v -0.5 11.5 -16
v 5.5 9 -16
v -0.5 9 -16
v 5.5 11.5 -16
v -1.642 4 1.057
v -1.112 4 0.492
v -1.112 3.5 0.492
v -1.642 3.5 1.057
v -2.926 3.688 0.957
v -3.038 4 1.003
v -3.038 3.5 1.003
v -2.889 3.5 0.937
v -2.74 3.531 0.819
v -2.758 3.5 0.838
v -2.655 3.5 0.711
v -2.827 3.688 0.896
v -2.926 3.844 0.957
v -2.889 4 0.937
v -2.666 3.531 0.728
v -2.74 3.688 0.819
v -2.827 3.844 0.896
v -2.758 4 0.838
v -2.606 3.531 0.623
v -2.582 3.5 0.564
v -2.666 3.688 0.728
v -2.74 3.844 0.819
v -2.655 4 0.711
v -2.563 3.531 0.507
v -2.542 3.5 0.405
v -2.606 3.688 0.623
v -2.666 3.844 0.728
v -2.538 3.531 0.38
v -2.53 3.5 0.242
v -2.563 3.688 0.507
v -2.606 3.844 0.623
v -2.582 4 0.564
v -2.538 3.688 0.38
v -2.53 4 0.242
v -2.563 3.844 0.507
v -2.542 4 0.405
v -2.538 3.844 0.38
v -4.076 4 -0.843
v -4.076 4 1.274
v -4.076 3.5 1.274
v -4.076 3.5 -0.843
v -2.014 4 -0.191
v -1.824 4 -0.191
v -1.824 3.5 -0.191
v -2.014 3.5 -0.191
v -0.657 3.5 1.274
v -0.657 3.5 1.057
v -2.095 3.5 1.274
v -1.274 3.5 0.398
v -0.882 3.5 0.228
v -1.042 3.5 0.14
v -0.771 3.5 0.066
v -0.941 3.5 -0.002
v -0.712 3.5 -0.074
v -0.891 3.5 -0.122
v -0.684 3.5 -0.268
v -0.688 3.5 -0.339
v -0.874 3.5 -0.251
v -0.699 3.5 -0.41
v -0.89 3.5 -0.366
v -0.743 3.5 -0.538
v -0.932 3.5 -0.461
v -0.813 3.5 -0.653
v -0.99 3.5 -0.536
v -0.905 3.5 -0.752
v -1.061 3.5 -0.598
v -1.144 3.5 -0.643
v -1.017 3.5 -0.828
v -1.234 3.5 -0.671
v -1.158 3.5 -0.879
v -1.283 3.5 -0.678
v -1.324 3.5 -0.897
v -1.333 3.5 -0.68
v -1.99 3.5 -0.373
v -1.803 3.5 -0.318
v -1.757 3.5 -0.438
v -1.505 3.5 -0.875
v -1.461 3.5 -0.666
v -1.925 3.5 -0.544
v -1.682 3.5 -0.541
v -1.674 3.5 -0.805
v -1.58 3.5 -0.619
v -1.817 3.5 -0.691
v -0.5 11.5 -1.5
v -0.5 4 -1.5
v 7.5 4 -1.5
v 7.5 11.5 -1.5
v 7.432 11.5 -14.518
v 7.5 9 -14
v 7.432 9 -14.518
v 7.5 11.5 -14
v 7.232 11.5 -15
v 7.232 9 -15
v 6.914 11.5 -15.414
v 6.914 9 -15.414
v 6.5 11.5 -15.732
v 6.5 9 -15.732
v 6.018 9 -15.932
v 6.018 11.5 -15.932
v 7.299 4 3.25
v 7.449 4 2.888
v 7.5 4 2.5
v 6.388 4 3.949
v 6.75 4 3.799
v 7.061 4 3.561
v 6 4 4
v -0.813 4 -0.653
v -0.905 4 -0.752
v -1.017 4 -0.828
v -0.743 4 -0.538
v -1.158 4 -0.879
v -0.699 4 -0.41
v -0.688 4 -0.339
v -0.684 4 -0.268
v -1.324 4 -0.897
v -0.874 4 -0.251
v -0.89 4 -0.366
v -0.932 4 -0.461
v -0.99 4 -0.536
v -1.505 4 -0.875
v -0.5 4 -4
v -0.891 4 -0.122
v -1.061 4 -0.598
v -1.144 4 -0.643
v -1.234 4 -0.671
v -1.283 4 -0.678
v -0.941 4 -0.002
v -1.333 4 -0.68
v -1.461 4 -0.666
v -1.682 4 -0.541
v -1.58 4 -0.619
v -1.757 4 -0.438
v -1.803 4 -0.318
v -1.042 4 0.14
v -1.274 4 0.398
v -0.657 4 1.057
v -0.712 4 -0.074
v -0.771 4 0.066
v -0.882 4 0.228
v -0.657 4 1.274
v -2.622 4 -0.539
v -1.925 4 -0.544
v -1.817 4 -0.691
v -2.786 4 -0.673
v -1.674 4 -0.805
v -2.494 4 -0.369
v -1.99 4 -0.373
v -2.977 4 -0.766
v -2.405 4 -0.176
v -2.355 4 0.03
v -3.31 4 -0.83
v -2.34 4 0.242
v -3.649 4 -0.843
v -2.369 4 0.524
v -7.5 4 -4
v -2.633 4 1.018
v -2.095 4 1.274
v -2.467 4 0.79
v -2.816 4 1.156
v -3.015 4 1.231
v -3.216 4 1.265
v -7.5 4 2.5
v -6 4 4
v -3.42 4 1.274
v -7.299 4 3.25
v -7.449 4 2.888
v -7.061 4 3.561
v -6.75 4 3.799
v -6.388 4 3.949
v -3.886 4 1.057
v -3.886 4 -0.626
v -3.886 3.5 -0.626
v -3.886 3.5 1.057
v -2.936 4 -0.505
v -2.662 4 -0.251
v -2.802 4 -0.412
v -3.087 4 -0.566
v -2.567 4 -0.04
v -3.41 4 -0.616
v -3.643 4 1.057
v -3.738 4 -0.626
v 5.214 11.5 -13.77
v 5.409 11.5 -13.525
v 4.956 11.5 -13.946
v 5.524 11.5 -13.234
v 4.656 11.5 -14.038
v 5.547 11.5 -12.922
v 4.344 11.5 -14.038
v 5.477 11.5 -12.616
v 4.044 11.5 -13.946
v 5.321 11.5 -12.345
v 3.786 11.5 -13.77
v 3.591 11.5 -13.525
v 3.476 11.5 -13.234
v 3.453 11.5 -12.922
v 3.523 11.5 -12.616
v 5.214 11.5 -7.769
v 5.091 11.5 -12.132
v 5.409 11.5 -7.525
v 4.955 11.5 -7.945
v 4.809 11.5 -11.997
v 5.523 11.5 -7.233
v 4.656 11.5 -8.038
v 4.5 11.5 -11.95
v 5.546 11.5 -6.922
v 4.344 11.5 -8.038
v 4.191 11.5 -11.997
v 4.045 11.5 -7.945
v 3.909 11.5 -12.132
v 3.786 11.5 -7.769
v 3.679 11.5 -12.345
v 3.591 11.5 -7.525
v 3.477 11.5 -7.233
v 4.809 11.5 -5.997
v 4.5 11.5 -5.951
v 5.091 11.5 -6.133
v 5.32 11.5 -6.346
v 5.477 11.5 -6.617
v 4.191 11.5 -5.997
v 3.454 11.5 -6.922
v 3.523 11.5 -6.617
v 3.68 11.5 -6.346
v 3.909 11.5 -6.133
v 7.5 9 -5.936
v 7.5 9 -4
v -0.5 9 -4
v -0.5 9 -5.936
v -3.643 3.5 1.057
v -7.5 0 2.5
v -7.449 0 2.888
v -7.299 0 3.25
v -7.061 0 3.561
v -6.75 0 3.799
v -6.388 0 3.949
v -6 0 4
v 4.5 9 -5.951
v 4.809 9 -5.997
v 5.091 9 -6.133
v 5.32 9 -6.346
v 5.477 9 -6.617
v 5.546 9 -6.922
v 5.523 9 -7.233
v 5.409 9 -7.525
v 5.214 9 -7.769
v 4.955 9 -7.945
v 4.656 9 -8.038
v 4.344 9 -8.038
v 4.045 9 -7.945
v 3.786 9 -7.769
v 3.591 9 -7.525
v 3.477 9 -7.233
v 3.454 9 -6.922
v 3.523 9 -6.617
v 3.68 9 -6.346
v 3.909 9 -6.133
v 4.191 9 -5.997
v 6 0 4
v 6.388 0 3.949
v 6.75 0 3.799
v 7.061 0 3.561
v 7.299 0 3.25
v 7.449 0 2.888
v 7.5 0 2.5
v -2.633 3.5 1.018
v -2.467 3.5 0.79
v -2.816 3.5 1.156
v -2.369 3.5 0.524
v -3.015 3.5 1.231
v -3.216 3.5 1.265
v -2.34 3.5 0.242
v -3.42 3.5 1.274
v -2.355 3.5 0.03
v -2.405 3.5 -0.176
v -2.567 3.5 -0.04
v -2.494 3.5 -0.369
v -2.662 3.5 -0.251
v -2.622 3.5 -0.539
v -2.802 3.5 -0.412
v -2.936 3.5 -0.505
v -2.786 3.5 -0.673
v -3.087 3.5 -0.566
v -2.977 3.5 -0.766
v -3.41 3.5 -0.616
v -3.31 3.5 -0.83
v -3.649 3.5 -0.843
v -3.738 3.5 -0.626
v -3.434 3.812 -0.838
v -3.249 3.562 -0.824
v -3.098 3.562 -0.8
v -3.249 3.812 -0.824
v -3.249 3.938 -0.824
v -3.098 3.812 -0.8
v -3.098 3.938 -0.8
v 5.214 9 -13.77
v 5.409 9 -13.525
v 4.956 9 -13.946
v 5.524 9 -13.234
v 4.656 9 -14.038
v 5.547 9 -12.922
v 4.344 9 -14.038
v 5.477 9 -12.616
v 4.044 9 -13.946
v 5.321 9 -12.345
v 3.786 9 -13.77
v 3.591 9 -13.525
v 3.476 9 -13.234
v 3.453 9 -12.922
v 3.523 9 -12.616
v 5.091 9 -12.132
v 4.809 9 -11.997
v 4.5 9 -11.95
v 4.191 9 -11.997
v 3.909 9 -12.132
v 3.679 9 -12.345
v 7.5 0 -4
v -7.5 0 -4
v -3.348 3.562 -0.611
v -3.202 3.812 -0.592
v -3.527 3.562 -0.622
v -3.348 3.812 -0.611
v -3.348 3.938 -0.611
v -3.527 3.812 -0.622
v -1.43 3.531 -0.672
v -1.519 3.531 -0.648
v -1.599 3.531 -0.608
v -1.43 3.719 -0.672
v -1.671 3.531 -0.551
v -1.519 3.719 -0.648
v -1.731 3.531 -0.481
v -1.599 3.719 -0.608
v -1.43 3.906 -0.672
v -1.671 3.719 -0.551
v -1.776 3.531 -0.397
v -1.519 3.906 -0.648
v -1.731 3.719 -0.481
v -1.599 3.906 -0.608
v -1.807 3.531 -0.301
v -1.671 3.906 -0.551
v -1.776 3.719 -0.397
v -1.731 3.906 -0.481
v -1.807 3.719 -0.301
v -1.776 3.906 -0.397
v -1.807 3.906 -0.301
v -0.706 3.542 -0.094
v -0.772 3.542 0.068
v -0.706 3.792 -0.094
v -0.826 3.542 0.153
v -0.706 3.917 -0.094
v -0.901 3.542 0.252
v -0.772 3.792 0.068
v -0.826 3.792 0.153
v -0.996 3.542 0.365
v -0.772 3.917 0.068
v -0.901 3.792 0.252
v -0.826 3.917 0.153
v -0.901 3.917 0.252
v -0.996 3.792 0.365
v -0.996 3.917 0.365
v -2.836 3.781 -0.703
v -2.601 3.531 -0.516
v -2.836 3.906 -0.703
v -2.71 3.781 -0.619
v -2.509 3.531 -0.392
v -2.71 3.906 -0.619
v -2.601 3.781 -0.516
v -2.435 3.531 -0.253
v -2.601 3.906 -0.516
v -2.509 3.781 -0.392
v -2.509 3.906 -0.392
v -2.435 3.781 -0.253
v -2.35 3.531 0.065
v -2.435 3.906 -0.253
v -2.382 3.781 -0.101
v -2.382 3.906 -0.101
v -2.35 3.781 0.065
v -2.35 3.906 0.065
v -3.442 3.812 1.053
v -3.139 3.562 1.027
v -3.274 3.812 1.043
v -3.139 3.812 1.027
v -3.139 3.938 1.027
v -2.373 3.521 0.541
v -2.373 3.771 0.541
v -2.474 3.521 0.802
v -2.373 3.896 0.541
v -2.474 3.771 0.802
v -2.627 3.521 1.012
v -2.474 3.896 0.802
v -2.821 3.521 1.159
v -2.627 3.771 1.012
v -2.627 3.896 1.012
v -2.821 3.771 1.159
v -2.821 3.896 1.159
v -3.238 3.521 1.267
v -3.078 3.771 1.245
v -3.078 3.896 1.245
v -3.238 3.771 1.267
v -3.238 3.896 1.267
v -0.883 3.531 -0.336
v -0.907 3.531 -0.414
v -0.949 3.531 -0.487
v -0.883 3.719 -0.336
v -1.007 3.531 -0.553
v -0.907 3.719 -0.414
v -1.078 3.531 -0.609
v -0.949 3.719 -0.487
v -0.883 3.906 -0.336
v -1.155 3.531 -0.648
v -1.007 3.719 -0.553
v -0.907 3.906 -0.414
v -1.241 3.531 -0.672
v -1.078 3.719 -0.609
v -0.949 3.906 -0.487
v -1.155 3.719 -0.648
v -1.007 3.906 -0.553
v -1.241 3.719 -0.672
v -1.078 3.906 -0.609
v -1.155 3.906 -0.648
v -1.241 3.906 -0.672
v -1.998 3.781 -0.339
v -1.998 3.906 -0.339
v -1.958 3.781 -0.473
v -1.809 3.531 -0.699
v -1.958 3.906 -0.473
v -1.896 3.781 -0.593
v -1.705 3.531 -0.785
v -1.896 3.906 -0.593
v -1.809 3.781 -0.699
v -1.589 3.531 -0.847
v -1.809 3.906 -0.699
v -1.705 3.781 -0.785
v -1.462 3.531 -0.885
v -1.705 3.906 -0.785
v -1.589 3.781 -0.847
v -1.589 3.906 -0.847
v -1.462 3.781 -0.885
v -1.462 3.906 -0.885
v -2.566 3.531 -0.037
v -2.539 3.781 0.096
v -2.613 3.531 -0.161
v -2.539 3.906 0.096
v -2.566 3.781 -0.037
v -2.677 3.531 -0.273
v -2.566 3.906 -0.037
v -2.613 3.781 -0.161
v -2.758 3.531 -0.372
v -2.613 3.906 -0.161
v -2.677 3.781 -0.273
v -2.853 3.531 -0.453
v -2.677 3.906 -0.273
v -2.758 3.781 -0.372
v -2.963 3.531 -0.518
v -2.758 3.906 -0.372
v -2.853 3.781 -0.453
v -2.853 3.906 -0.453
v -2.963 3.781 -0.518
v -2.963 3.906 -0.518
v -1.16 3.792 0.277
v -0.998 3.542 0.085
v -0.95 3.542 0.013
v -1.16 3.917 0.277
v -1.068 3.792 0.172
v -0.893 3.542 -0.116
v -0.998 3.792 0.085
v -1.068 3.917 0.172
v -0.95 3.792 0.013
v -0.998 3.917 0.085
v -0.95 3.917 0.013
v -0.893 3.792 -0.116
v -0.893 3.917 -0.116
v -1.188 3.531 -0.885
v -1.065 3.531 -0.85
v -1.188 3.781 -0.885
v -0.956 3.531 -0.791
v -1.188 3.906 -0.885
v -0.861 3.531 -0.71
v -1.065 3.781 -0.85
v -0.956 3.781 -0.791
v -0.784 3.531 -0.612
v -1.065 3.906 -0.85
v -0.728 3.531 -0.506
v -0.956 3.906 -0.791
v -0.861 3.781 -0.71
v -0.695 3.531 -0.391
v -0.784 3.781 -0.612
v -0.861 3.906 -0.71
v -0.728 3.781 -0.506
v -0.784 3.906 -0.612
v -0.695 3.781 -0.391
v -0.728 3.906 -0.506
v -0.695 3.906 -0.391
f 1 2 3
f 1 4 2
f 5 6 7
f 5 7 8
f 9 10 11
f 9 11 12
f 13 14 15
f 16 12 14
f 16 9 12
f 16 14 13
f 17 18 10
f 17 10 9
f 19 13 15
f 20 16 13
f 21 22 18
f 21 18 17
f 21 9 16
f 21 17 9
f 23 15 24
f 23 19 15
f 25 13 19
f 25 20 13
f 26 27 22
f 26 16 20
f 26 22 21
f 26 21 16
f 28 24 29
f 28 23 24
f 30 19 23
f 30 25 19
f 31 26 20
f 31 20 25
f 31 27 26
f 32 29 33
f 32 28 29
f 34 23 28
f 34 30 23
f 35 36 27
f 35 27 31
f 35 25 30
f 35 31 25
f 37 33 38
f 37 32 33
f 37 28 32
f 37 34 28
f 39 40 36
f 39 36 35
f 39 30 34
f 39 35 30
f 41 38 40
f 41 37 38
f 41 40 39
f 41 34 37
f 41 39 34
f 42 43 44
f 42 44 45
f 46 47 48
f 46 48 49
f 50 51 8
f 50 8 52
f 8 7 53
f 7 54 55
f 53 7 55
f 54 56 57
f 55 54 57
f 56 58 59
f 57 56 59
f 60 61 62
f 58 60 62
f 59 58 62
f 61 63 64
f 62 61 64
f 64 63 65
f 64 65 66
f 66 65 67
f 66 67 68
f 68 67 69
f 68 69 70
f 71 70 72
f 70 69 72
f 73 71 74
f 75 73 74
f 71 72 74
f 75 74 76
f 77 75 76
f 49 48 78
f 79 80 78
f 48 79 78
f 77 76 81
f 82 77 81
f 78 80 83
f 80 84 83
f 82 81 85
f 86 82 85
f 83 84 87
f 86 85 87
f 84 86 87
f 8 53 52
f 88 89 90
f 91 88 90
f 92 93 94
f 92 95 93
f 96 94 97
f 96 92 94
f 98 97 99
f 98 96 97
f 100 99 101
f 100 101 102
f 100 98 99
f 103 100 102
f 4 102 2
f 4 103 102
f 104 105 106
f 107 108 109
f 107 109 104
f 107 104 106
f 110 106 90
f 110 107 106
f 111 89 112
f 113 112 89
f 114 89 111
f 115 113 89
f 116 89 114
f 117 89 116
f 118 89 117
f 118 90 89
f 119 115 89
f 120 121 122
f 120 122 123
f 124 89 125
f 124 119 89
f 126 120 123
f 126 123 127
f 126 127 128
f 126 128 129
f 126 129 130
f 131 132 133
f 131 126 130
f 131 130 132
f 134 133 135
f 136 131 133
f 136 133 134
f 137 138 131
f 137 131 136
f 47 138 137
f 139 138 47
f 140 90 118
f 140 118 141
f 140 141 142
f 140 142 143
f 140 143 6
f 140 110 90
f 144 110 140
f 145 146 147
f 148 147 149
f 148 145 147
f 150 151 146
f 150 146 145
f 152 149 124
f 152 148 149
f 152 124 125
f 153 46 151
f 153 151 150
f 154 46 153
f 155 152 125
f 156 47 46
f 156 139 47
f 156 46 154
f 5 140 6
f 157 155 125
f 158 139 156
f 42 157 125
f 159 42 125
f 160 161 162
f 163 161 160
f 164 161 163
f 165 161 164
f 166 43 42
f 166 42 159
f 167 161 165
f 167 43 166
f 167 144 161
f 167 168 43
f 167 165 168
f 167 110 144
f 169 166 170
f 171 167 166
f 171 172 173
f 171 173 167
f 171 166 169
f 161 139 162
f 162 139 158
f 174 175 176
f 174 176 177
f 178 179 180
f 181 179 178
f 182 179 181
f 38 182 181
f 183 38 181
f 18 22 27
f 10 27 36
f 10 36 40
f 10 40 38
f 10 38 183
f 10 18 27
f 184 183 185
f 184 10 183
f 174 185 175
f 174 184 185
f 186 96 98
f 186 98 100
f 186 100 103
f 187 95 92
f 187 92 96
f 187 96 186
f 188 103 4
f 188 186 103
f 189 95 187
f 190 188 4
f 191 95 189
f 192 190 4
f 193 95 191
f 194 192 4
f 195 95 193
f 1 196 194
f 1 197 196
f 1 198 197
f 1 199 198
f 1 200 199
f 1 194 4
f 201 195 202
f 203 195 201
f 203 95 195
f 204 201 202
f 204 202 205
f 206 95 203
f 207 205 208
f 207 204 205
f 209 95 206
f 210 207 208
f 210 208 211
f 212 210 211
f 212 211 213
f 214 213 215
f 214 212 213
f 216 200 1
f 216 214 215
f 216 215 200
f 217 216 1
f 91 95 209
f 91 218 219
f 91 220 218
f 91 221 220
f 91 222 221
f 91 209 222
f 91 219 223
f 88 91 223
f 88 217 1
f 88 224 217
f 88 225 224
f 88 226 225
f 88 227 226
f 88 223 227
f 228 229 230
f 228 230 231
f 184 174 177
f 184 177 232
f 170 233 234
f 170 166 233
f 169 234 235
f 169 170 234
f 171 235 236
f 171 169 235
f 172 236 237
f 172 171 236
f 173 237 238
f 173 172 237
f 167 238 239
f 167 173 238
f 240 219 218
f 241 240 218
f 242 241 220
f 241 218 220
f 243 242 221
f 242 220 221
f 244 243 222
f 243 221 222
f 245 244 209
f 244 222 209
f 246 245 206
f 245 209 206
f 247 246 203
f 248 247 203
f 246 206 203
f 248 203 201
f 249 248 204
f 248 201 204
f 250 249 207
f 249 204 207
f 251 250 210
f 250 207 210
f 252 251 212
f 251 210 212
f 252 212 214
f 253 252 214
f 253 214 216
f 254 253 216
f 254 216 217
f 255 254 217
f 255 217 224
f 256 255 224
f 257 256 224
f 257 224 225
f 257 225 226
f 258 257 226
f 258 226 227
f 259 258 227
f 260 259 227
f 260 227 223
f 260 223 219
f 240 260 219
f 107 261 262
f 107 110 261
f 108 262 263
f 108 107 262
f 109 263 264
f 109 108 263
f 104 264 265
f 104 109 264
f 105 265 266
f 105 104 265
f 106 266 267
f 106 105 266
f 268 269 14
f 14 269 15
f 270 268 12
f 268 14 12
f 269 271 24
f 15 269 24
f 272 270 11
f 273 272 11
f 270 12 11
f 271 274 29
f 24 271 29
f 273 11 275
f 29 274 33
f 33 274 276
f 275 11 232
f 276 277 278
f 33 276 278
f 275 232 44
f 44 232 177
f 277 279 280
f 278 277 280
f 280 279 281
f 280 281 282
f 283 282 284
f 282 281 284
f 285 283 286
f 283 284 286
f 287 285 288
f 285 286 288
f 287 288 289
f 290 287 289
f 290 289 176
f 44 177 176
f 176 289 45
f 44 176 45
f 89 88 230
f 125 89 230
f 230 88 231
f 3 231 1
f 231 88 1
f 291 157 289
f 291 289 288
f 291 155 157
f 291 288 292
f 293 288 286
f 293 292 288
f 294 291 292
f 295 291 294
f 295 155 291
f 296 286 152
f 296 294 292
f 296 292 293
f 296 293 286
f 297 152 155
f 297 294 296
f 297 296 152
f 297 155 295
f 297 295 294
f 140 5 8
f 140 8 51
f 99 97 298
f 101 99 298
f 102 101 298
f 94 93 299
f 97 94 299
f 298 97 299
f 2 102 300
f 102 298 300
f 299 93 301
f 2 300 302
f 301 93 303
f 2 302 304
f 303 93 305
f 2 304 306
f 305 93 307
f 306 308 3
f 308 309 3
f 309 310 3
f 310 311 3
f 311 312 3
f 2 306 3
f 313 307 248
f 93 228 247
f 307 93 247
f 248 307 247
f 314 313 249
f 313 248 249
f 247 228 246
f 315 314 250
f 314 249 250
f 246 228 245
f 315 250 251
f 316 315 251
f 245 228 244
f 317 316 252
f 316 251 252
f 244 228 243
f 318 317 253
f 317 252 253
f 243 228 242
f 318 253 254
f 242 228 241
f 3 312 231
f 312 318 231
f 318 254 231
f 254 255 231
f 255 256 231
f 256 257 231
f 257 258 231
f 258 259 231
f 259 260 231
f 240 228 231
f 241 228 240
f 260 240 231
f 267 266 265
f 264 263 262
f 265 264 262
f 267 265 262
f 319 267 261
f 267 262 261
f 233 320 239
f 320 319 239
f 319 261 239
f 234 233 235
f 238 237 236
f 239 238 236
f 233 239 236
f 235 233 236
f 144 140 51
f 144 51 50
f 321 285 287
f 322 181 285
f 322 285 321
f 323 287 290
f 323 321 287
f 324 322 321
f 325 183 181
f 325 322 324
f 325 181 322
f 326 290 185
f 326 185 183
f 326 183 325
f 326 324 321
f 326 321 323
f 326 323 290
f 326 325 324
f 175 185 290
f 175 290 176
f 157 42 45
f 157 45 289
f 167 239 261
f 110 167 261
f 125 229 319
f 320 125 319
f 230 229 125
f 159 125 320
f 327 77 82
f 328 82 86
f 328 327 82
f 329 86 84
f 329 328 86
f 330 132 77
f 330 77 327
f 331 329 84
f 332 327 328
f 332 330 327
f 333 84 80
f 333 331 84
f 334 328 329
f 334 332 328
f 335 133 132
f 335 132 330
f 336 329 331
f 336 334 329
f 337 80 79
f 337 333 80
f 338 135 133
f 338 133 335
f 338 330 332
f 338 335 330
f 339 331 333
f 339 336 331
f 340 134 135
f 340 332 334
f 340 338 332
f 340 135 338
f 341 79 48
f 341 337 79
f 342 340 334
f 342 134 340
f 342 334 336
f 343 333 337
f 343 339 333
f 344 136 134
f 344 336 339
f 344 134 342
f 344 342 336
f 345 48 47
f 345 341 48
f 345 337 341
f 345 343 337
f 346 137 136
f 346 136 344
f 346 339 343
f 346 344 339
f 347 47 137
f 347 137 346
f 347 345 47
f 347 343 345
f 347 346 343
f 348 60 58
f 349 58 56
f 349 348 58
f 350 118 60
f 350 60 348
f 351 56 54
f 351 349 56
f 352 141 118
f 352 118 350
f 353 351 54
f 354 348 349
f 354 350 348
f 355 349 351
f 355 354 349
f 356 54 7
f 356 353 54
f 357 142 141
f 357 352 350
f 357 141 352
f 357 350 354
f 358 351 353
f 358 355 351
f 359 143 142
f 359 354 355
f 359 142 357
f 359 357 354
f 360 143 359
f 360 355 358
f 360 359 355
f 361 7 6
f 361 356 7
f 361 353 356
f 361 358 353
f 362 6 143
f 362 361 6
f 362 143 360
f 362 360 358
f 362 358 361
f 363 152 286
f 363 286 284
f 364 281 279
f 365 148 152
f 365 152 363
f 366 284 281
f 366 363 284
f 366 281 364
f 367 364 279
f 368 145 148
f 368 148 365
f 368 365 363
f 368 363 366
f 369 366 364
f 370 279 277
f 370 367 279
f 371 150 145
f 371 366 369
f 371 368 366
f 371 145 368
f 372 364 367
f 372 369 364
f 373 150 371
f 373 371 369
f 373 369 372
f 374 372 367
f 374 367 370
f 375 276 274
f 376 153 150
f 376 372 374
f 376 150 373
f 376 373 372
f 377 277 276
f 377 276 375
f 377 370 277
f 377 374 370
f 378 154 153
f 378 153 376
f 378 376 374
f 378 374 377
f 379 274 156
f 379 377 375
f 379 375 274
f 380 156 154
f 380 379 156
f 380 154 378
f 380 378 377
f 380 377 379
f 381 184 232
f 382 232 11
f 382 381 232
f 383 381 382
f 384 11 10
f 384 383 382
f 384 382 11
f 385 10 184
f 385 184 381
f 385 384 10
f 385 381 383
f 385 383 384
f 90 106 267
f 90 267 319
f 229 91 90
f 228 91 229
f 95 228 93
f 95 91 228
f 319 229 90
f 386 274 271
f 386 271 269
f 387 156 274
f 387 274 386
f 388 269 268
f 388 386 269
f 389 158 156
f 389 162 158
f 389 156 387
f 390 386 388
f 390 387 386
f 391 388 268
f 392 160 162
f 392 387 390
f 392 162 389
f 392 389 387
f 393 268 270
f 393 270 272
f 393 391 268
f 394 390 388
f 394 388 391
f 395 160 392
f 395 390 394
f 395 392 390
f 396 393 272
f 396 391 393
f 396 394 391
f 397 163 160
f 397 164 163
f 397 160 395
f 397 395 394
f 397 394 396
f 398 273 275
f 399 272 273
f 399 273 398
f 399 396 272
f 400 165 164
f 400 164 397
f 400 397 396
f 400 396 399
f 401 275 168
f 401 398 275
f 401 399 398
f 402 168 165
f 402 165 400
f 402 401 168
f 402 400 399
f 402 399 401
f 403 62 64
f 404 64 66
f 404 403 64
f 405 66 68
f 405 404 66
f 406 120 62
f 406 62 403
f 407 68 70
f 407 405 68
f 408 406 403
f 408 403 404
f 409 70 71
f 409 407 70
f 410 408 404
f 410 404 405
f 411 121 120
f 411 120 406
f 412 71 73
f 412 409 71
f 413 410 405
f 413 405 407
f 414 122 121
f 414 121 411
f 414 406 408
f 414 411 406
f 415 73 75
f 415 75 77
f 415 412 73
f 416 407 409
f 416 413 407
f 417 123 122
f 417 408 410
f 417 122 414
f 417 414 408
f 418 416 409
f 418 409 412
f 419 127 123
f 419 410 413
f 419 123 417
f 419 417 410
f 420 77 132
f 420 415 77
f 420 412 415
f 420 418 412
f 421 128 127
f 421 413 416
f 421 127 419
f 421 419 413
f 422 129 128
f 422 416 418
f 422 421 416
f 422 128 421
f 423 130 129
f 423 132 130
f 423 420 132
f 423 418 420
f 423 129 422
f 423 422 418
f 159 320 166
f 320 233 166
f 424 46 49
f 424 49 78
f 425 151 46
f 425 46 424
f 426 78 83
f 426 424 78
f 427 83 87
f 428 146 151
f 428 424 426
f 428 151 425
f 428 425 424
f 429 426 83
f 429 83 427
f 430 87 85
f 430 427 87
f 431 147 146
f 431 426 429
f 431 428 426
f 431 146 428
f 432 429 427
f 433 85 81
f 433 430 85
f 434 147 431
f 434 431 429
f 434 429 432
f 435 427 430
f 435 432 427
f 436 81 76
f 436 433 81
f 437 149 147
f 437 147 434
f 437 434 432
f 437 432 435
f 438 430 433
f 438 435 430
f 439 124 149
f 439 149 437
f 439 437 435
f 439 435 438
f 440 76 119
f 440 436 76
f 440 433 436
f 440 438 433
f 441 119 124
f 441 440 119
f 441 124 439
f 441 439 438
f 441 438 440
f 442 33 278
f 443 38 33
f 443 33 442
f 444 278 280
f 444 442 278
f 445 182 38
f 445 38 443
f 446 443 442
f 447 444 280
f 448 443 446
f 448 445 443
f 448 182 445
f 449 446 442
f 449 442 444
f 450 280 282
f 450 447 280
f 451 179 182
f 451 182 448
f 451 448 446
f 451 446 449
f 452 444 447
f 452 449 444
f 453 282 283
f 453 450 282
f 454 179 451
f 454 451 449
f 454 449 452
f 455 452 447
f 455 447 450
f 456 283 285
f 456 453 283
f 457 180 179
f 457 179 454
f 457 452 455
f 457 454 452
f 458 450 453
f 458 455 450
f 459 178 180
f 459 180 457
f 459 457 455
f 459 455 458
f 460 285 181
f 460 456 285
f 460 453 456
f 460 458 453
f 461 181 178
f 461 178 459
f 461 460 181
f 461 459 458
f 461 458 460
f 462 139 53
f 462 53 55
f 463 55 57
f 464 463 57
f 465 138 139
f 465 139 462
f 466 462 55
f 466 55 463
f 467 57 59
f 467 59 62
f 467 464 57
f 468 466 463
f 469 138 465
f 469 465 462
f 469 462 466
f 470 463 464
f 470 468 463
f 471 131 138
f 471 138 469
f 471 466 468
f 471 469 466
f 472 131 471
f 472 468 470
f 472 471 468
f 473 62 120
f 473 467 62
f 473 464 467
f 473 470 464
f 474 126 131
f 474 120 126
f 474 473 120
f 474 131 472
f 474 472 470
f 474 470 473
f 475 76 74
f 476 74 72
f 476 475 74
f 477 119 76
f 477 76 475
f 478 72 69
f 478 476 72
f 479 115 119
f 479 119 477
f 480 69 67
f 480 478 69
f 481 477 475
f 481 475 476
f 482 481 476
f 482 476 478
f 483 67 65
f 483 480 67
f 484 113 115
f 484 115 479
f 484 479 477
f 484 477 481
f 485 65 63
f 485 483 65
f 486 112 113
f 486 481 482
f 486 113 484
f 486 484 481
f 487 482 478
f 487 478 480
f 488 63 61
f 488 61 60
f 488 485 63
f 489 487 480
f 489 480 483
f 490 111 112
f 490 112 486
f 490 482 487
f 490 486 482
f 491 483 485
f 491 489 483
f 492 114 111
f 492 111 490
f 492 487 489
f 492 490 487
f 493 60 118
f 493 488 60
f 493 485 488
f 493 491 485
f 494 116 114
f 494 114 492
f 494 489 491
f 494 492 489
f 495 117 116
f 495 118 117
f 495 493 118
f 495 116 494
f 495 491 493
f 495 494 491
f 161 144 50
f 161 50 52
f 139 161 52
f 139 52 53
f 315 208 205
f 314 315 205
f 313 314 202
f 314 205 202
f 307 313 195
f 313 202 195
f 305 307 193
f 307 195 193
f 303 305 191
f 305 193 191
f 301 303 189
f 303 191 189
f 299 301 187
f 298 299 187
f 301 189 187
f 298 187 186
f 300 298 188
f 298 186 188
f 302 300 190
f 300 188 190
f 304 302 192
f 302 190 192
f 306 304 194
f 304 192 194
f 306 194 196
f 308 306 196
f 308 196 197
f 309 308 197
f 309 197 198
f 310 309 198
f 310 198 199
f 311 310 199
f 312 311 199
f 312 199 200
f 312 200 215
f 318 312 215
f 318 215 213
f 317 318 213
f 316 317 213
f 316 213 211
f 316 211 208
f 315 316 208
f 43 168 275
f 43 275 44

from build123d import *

# Parameters (mm, degrees)
SKETCH1_W           = 15
SKETCH1_H           = 8
BOSS_EXTRUDE1_DEPTH = 4
FILLET1_R           = 1.5
SKETCH10_W          = 7
SKETCH10_H          = 4
CUT_EXTRUDE2_DEPTH  = 7.5
SKETCH11_W          = 8
SKETCH11_H          = 2.5
BOSS_EXTRUDE4_DEPTH = 7.5
SKETCH12_W          = 8
SKETCH12_H          = 2.5
BOSS_EXTRUDE5_DEPTH = 12
FILLET2_R           = 2
SKETCH13_R          = 1.05
SKETCH13_R_2        = 1.049219919
CUT_EXTRUDE3_DEPTH  = 12
SKETCH14_W          = 8
SKETCH14_H          = 1.936154072
BOSS_EXTRUDE6_DEPTH = 7.5
SKETCH16_W          = 7
SKETCH16_H          = 4
BOSS_EXTRUDE7_DEPTH = 4
SKETCH17_W          = 1.936154072
SKETCH17_H          = 7.50023418
CUT_EXTRUDE4_DEPTH  = 8
CUT_EXTRUDE5_DEPTH  = 0.5


with BuildPart() as part:
    # Sketch1 → Boss-Extrude1 (new body)
    with BuildSketch(Plane(origin=(0, 0, 0), x_dir=(1, 0, 0), z_dir=(0, 1, 0))):
        Rectangle(SKETCH1_W, SKETCH1_H)
    extrude(amount=BOSS_EXTRUDE1_DEPTH)

    # Fillet1
    fillet1_edges = [part.edges().sort_by_distance(p)[0] for p in [
        (7.5, 2, 4),
        (-7.5, 2, 4),
    ]]
    fillet(fillet1_edges, radius=FILLET1_R)

    # Sketch10 → Cut-Extrude2 (cut)
    with BuildSketch(Plane(origin=(0, 4, 0), x_dir=(1, 0, 0), z_dir=(0, 1, 0))):
        with Locations((-4, 2)):
            Rectangle(SKETCH10_W, SKETCH10_H)
    extrude(amount=-CUT_EXTRUDE2_DEPTH, mode=Mode.SUBTRACT)

    # Sketch11 → Boss-Extrude4 (add)
    with BuildSketch(Plane(origin=(0, 4, 0), x_dir=(1, 0, 0), z_dir=(0, 1, 0))):
        with Locations((3.5, 2.75)):
            Rectangle(SKETCH11_W, SKETCH11_H)
    extrude(amount=BOSS_EXTRUDE4_DEPTH)

    # Sketch12 → Boss-Extrude5 (add)
    with BuildSketch(Plane(origin=(0, 0, -4), x_dir=(-1, 0, 0), z_dir=(0, 0, -1))):
        with Locations((-3.5, 10.25)):
            Rectangle(SKETCH12_W, SKETCH12_H)
    extrude(amount=BOSS_EXTRUDE5_DEPTH)

    # Fillet2
    fillet2_edges = [part.edges().sort_by_distance(p)[0] for p in [
        (7.5, 10.25, -16),
    ]]
    fillet(fillet2_edges, radius=FILLET2_R)

    # Sketch13 → Cut-Extrude3 (cut)
    with BuildSketch(Plane(origin=(0, 11.5, 0), x_dir=(1, 0, 0), z_dir=(0, 1, 0))):
        with Locations(Location((4.5, 13, 0), (0, 0, 270))):
            Circle(SKETCH13_R)
        with Locations(Location((4.5, 7, 0), (0, 0, 270))):
            Circle(SKETCH13_R_2)
    extrude(amount=-CUT_EXTRUDE3_DEPTH, mode=Mode.SUBTRACT)

    # Sketch14 → Boss-Extrude6 (add)
    with BuildSketch(Plane(origin=(0, 9, 0), x_dir=(-1, 0, 0), z_dir=(0, -1, 0))):
        with Locations((-3.5, 4.968077036)):
            Rectangle(SKETCH14_W, SKETCH14_H)
    extrude(amount=BOSS_EXTRUDE6_DEPTH)

    # Sketch16 → Boss-Extrude7 (add)
    with BuildSketch(Plane(origin=(0, 0, 0), x_dir=(-1, 0, 0), z_dir=(0, 0, -1))):
        with Locations((4, 2)):
            Rectangle(SKETCH16_W, SKETCH16_H)
    extrude(amount=BOSS_EXTRUDE7_DEPTH)

    # Sketch17 → Cut-Extrude4 (cut)
    with BuildSketch(Plane(origin=(7.5, 0, 0), x_dir=(0, 0, -1), z_dir=(1, 0, 0))):
        with Locations((4.968077036, 5.25011709)):
            Rectangle(SKETCH17_W, SKETCH17_H)
    extrude(amount=-CUT_EXTRUDE4_DEPTH, mode=Mode.SUBTRACT)

    # Sketch19 → Cut-Extrude5 (cut)
    # profile 1 of 2: a face of its own
    with BuildSketch(Plane(origin=(0, 4, 0), x_dir=(1, 0, 0), z_dir=(0, 1, 0))):
        with BuildLine():
            Line((-4.076318052, -1.273977892), (-4.076318052, 0.842688775))
            Line((-4.076318052, 0.842688775), (-3.648914206, 0.842688775))
            add(Edge.make_bspline(
                [(-3.648914206, 0.842688775), (-3.611740103, 0.842421125), (-3.539919931, 0.841904028), (-3.43613526, 0.838625377), (-3.34010889, 0.832825428), (-3.252156637, 0.824377191), (-3.172037047, 0.81400369), (-3.09997446, 0.801001064), (-3.035596259, 0.785647266), (-2.996002835, 0.772556922), (-2.97727959, 0.766366659)],
                knots=[0, 0, 0, 0, 1.314313732, 2.53924729, 3.670748893, 4.714932338, 5.66265055, 6.526160246, 7.303039223, 8, 8, 8, 8], degree=3))
            add(Edge.make_bspline(
                [(-2.97727959, 0.766366659), (-2.952789915, 0.757034756), (-2.904365908, 0.738582567), (-2.835418743, 0.703774708), (-2.770512452, 0.664336309), (-2.709298969, 0.620215382), (-2.653176565, 0.570162657), (-2.599952742, 0.516304325), (-2.55180479, 0.456681852), (-2.50771263, 0.39253174), (-2.467958207, 0.32460969), (-2.433402621, 0.253045124), (-2.404704254, 0.178201479), (-2.380880731, 0.10028689), (-2.362105016, 0.019130033), (-2.349294991, -0.065363591), (-2.340845868, -0.152860053), (-2.339996751, -0.212232229), (-2.339565915, -0.242357299)],
                knots=[0, 0, 0, 0, 0.984719456, 1.947108742, 2.898477687, 3.838006223, 4.779231079, 5.722358779, 6.681677486, 7.655904652, 8.64651281, 9.637519902, 10.640069247, 11.656948941, 12.698408672, 13.768548281, 14.867775369, 16, 16, 16, 16], degree=3))
            add(Edge.make_bspline(
                [(-2.339565915, -0.242357299), (-2.339946291, -0.268520048), (-2.34069586, -0.320076478), (-2.347426447, -0.396059305), (-2.357209269, -0.469787989), (-2.372355046, -0.540911436), (-2.390741327, -0.610052787), (-2.414305362, -0.676475144), (-2.441299209, -0.740787829), (-2.472776993, -0.802121255), (-2.507333926, -0.860228818), (-2.54441898, -0.915005447), (-2.583992601, -0.965669509), (-2.62643215, -1.012374432), (-2.671189198, -1.055049806), (-2.718556769, -1.09405212), (-2.76865709, -1.128618227), (-2.821265765, -1.16010643), (-2.87791752, -1.187574931), (-2.939685401, -1.210815937), (-3.006832827, -1.230075557), (-3.079194982, -1.246144622), (-3.156896895, -1.258891372), (-3.240014746, -1.267434476), (-3.328420831, -1.273211726), (-3.389126386, -1.273717544), (-3.420371871, -1.273977892)],
                knots=[0, 0, 0, 0, 1.105936401, 2.179363191, 3.223086493, 4.248585256, 5.251745608, 6.245858792, 7.225916811, 8.198733463, 9.158002045, 10.082870192, 10.993790845, 11.873723703, 12.748670949, 13.606408763, 14.465103618, 15.319838547, 16.196477973, 17.123216899, 18.106603292, 19.147568657, 20.255746949, 21.433717677, 22.679120308, 24, 24, 24, 24], degree=3))
            Line((-3.420371871, -1.273977892), (-4.076318052, -1.273977892))
        make_face()
        with BuildLine():
            Line((-3.886360787, -1.056883875), (-3.643402053, -1.056883875))
            add(Edge.make_bspline(
                [(-3.643402053, -1.056883875), (-3.608490133, -1.056733836), (-3.541341727, -1.056445255), (-3.444786652, -1.053912994), (-3.35656435, -1.049775251), (-3.276662295, -1.043984609), (-3.205125599, -1.036323113), (-3.14180476, -1.02778091), (-3.086907342, -1.017138642), (-3.053688111, -1.00749211), (-3.038337282, -1.003034383)],
                knots=[0, 0, 0, 0, 1.375205317, 2.645023457, 3.804390687, 4.853969522, 5.800190428, 6.637939096, 7.370582563, 8, 8, 8, 8], degree=3))
            add(Edge.make_bspline(
                [(-3.038337282, -1.003034383), (-3.01901613, -0.996229869), (-2.980835311, -0.982783367), (-2.925873893, -0.958255638), (-2.874616085, -0.929201625), (-2.826168594, -0.896905964), (-2.781218664, -0.860229572), (-2.739233603, -0.819969974), (-2.700297942, -0.775922277), (-2.664813956, -0.728141151), (-2.633058934, -0.676923988), (-2.605559667, -0.622774313), (-2.581458979, -0.566285432), (-2.562542877, -0.506589894), (-2.547716786, -0.444221368), (-2.537215284, -0.379175467), (-2.530674951, -0.31146434), (-2.529912075, -0.265410436), (-2.52952318, -0.241933287)],
                knots=[0, 0, 0, 0, 0.998632004, 1.973411704, 2.929992603, 3.868527914, 4.809262121, 5.754881198, 6.702106254, 7.672490631, 8.653608572, 9.636854334, 10.631411391, 11.644891563, 12.686317036, 13.754757253, 14.855430412, 16, 16, 16, 16], degree=3))
            add(Edge.make_bspline(
                [(-2.52952318, -0.241933287), (-2.529833597, -0.217178278), (-2.530443413, -0.168546843), (-2.538108353, -0.097190565), (-2.549309484, -0.028561791), (-2.565507237, 0.03734407), (-2.586148292, 0.100655598), (-2.611907909, 0.161022635), (-2.641339626, 0.219082722), (-2.676357359, 0.273495791), (-2.714708694, 0.324956862), (-2.757270554, 0.372101025), (-2.803366739, 0.415035673), (-2.852494482, 0.454429448), (-2.906038346, 0.488697481), (-2.962737007, 0.519350854), (-3.023422246, 0.545365227), (-3.065642305, 0.559201491), (-3.087098634, 0.566233112)],
                knots=[0, 0, 0, 0, 1.122418816, 2.205001699, 3.251619955, 4.274784885, 5.280384055, 6.268708349, 7.249350384, 8.229342522, 9.199999885, 10.157847722, 11.105861043, 12.055065948, 13.010012805, 13.98527497, 14.976112212, 16, 16, 16, 16], degree=3))
            add(Edge.make_bspline(
                [(-3.087098634, 0.566233112), (-3.104849089, 0.571141618), (-3.142591427, 0.58157845), (-3.204180055, 0.592963318), (-3.273494931, 0.603005086), (-3.350843798, 0.611506853), (-3.436138485, 0.617607281), (-3.529444592, 0.622186123), (-3.630802448, 0.62527442), (-3.701065219, 0.625485305), (-3.737532662, 0.625594757)],
                knots=[0, 0, 0, 0, 0.674548936, 1.434276114, 2.292660221, 3.240891867, 4.284742987, 5.42552168, 6.663806718, 8, 8, 8, 8], degree=3))
            Line((-3.737532662, 0.625594757), (-3.886360787, 0.625594757))
            Line((-3.886360787, 0.625594757), (-3.886360787, -1.056883875))
        make_face(mode=Mode.SUBTRACT)
    # profile 2 of 2: a face of its own
    with BuildSketch(Plane(origin=(0, 4, 0), x_dir=(1, 0, 0), z_dir=(0, 1, 0))):
        with BuildLine():
            Line((-1.823967624, 0.191406723), (-2.013924889, 0.191406723))
            add(Edge.make_bspline(
                [(-2.013924889, 0.191406723), (-2.012686849, 0.216607689), (-2.010255371, 0.266101714), (-1.998868739, 0.338264267), (-1.982575923, 0.407240264), (-1.959539663, 0.472475879), (-1.930930628, 0.53454792), (-1.896622469, 0.593209834), (-1.855986188, 0.648237838), (-1.809899258, 0.699121806), (-1.759843938, 0.745801908), (-1.705835108, 0.78611246), (-1.649081211, 0.820171242), (-1.589754431, 0.848644183), (-1.527185424, 0.870016376), (-1.461941981, 0.885874224), (-1.393737456, 0.895415157), (-1.347267538, 0.896440704), (-1.323633757, 0.896962279)],
                knots=[0, 0, 0, 0, 1.10065271, 2.161652631, 3.183658789, 4.190468796, 5.17591951, 6.163126047, 7.15150782, 8.156236427, 9.156009102, 10.134482811, 11.092018607, 12.041330605, 13.001268258, 13.972401359, 14.968799086, 16, 16, 16, 16], degree=3))
            add(Edge.make_bspline(
                [(-1.323633757, 0.896962279), (-1.30042416, 0.896418927), (-1.25481813, 0.895351259), (-1.188256817, 0.886182446), (-1.124891501, 0.871822017), (-1.064846042, 0.851674122), (-1.008599517, 0.824590206), (-0.95572939, 0.792055504), (-0.905606233, 0.754427321), (-0.860486893, 0.710126205), (-0.819055816, 0.662832382), (-0.783313024, 0.612342078), (-0.75270411, 0.560193891), (-0.727190609, 0.505990169), (-0.708409039, 0.449220547), (-0.694149837, 0.390711525), (-0.686089925, 0.329857472), (-0.684852931, 0.288669222), (-0.684224035, 0.267728839)],
                knots=[0, 0, 0, 0, 1.111607364, 2.184268762, 3.212621178, 4.221274766, 5.211760367, 6.196651075, 7.1921475, 8.207485113, 9.220403448, 10.201281604, 11.166441695, 12.114753415, 13.065576456, 14.026450734, 14.996634279, 16, 16, 16, 16], degree=3))
            add(Edge.make_bspline(
                [(-0.684224035, 0.267728839), (-0.685248055, 0.238248005), (-0.687278127, 0.179803686), (-0.704643488, 0.093918507), (-0.73176495, 0.010707249), (-0.764420494, -0.056262453), (-0.797363353, -0.110227471), (-0.827049608, -0.154658545), (-0.861802136, -0.202498519), (-0.902126752, -0.253587194), (-0.947189298, -0.308324741), (-0.99739794, -0.366678094), (-1.053110712, -0.428044355), (-1.09221371, -0.469957742), (-1.112475904, -0.491676209)],
                knots=[0, 0, 0, 0, 1.184426356, 2.348067706, 3.509069118, 4.696110526, 5.333549288, 6.050745305, 6.844228056, 7.710549037, 8.667450064, 9.695053472, 10.805634456, 12, 12, 12, 12], degree=3))
            Line((-1.112475904, -0.491676209), (-1.642066583, -1.056883875))
            Line((-1.642066583, -1.056883875), (-0.657087282, -1.056883875))
            Line((-0.657087282, -1.056883875), (-0.657087282, -1.273977892))
            Line((-0.657087282, -1.273977892), (-2.095335146, -1.273977892))
            Line((-2.095335146, -1.273977892), (-1.274448394, -0.397969612))
            add(Edge.make_bspline(
                [(-1.274448394, -0.397969612), (-1.254462291, -0.377106351), (-1.216073077, -0.337032295), (-1.161775995, -0.278525838), (-1.113008607, -0.224248735), (-1.069455231, -0.174303537), (-1.032060683, -0.127959684), (-0.998876047, -0.086718125), (-0.972287333, -0.048766624), (-0.943430879, -0.004775872), (-0.915482424, 0.048934434), (-0.891465903, 0.114571475), (-0.876821686, 0.182139861), (-0.875064952, 0.227800617), (-0.8741813, 0.250768369)],
                knots=[0, 0, 0, 0, 1.329631726, 2.553950428, 3.673215718, 4.687767853, 5.603093632, 6.413772471, 7.123043292, 7.734684054, 8.834405432, 9.900288307, 10.943827018, 12, 12, 12, 12], degree=3))
            add(Edge.make_bspline(
                [(-0.8741813, 0.250768369), (-0.874565772, 0.265210929), (-0.875323494, 0.293674441), (-0.882010768, 0.335406495), (-0.892116646, 0.375662359), (-0.906597826, 0.414565857), (-0.925712378, 0.451725847), (-0.948979613, 0.487187561), (-0.975825032, 0.521470887), (-1.006880323, 0.553615977), (-1.040995862, 0.583056516), (-1.077036193, 0.60913632), (-1.115166495, 0.630931401), (-1.155225997, 0.648798183), (-1.197103019, 0.66281377), (-1.240878555, 0.672525387), (-1.286431651, 0.67862289), (-1.31753667, 0.679447889), (-1.333386027, 0.679868262)],
                knots=[0, 0, 0, 0, 0.991446411, 1.95395049, 2.89581595, 3.838931463, 4.798493298, 5.75982156, 6.748411868, 7.785213223, 8.824556874, 9.840280684, 10.836137867, 11.835679398, 12.848801643, 13.863922112, 14.911575587, 16, 16, 16, 16], degree=3))
            add(Edge.make_bspline(
                [(-1.333386027, 0.679868262), (-1.349938864, 0.679435837), (-1.382445903, 0.678586628), (-1.430173127, 0.672646255), (-1.475703098, 0.662398056), (-1.519150344, 0.648381686), (-1.560588379, 0.630566278), (-1.599815682, 0.608376509), (-1.636744191, 0.58189792), (-1.671443327, 0.551877202), (-1.703413447, 0.518453463), (-1.731502748, 0.481194104), (-1.756046414, 0.440779429), (-1.77746057, 0.397318487), (-1.794850915, 0.350416915), (-1.80813944, 0.300241208), (-1.818654342, 0.247009229), (-1.822167114, 0.210248726), (-1.823967624, 0.191406723)],
                knots=[0, 0, 0, 0, 1.031018746, 2.02475058, 2.990194455, 3.934040569, 4.864654155, 5.795059489, 6.735614925, 7.690564532, 8.649604399, 9.611025574, 10.590972636, 11.591080095, 12.624614302, 13.701020113, 14.821632451, 16, 16, 16, 16], degree=3))
        make_face()
    extrude(amount=-CUT_EXTRUDE5_DEPTH, mode=Mode.SUBTRACT)


solid = part.part
